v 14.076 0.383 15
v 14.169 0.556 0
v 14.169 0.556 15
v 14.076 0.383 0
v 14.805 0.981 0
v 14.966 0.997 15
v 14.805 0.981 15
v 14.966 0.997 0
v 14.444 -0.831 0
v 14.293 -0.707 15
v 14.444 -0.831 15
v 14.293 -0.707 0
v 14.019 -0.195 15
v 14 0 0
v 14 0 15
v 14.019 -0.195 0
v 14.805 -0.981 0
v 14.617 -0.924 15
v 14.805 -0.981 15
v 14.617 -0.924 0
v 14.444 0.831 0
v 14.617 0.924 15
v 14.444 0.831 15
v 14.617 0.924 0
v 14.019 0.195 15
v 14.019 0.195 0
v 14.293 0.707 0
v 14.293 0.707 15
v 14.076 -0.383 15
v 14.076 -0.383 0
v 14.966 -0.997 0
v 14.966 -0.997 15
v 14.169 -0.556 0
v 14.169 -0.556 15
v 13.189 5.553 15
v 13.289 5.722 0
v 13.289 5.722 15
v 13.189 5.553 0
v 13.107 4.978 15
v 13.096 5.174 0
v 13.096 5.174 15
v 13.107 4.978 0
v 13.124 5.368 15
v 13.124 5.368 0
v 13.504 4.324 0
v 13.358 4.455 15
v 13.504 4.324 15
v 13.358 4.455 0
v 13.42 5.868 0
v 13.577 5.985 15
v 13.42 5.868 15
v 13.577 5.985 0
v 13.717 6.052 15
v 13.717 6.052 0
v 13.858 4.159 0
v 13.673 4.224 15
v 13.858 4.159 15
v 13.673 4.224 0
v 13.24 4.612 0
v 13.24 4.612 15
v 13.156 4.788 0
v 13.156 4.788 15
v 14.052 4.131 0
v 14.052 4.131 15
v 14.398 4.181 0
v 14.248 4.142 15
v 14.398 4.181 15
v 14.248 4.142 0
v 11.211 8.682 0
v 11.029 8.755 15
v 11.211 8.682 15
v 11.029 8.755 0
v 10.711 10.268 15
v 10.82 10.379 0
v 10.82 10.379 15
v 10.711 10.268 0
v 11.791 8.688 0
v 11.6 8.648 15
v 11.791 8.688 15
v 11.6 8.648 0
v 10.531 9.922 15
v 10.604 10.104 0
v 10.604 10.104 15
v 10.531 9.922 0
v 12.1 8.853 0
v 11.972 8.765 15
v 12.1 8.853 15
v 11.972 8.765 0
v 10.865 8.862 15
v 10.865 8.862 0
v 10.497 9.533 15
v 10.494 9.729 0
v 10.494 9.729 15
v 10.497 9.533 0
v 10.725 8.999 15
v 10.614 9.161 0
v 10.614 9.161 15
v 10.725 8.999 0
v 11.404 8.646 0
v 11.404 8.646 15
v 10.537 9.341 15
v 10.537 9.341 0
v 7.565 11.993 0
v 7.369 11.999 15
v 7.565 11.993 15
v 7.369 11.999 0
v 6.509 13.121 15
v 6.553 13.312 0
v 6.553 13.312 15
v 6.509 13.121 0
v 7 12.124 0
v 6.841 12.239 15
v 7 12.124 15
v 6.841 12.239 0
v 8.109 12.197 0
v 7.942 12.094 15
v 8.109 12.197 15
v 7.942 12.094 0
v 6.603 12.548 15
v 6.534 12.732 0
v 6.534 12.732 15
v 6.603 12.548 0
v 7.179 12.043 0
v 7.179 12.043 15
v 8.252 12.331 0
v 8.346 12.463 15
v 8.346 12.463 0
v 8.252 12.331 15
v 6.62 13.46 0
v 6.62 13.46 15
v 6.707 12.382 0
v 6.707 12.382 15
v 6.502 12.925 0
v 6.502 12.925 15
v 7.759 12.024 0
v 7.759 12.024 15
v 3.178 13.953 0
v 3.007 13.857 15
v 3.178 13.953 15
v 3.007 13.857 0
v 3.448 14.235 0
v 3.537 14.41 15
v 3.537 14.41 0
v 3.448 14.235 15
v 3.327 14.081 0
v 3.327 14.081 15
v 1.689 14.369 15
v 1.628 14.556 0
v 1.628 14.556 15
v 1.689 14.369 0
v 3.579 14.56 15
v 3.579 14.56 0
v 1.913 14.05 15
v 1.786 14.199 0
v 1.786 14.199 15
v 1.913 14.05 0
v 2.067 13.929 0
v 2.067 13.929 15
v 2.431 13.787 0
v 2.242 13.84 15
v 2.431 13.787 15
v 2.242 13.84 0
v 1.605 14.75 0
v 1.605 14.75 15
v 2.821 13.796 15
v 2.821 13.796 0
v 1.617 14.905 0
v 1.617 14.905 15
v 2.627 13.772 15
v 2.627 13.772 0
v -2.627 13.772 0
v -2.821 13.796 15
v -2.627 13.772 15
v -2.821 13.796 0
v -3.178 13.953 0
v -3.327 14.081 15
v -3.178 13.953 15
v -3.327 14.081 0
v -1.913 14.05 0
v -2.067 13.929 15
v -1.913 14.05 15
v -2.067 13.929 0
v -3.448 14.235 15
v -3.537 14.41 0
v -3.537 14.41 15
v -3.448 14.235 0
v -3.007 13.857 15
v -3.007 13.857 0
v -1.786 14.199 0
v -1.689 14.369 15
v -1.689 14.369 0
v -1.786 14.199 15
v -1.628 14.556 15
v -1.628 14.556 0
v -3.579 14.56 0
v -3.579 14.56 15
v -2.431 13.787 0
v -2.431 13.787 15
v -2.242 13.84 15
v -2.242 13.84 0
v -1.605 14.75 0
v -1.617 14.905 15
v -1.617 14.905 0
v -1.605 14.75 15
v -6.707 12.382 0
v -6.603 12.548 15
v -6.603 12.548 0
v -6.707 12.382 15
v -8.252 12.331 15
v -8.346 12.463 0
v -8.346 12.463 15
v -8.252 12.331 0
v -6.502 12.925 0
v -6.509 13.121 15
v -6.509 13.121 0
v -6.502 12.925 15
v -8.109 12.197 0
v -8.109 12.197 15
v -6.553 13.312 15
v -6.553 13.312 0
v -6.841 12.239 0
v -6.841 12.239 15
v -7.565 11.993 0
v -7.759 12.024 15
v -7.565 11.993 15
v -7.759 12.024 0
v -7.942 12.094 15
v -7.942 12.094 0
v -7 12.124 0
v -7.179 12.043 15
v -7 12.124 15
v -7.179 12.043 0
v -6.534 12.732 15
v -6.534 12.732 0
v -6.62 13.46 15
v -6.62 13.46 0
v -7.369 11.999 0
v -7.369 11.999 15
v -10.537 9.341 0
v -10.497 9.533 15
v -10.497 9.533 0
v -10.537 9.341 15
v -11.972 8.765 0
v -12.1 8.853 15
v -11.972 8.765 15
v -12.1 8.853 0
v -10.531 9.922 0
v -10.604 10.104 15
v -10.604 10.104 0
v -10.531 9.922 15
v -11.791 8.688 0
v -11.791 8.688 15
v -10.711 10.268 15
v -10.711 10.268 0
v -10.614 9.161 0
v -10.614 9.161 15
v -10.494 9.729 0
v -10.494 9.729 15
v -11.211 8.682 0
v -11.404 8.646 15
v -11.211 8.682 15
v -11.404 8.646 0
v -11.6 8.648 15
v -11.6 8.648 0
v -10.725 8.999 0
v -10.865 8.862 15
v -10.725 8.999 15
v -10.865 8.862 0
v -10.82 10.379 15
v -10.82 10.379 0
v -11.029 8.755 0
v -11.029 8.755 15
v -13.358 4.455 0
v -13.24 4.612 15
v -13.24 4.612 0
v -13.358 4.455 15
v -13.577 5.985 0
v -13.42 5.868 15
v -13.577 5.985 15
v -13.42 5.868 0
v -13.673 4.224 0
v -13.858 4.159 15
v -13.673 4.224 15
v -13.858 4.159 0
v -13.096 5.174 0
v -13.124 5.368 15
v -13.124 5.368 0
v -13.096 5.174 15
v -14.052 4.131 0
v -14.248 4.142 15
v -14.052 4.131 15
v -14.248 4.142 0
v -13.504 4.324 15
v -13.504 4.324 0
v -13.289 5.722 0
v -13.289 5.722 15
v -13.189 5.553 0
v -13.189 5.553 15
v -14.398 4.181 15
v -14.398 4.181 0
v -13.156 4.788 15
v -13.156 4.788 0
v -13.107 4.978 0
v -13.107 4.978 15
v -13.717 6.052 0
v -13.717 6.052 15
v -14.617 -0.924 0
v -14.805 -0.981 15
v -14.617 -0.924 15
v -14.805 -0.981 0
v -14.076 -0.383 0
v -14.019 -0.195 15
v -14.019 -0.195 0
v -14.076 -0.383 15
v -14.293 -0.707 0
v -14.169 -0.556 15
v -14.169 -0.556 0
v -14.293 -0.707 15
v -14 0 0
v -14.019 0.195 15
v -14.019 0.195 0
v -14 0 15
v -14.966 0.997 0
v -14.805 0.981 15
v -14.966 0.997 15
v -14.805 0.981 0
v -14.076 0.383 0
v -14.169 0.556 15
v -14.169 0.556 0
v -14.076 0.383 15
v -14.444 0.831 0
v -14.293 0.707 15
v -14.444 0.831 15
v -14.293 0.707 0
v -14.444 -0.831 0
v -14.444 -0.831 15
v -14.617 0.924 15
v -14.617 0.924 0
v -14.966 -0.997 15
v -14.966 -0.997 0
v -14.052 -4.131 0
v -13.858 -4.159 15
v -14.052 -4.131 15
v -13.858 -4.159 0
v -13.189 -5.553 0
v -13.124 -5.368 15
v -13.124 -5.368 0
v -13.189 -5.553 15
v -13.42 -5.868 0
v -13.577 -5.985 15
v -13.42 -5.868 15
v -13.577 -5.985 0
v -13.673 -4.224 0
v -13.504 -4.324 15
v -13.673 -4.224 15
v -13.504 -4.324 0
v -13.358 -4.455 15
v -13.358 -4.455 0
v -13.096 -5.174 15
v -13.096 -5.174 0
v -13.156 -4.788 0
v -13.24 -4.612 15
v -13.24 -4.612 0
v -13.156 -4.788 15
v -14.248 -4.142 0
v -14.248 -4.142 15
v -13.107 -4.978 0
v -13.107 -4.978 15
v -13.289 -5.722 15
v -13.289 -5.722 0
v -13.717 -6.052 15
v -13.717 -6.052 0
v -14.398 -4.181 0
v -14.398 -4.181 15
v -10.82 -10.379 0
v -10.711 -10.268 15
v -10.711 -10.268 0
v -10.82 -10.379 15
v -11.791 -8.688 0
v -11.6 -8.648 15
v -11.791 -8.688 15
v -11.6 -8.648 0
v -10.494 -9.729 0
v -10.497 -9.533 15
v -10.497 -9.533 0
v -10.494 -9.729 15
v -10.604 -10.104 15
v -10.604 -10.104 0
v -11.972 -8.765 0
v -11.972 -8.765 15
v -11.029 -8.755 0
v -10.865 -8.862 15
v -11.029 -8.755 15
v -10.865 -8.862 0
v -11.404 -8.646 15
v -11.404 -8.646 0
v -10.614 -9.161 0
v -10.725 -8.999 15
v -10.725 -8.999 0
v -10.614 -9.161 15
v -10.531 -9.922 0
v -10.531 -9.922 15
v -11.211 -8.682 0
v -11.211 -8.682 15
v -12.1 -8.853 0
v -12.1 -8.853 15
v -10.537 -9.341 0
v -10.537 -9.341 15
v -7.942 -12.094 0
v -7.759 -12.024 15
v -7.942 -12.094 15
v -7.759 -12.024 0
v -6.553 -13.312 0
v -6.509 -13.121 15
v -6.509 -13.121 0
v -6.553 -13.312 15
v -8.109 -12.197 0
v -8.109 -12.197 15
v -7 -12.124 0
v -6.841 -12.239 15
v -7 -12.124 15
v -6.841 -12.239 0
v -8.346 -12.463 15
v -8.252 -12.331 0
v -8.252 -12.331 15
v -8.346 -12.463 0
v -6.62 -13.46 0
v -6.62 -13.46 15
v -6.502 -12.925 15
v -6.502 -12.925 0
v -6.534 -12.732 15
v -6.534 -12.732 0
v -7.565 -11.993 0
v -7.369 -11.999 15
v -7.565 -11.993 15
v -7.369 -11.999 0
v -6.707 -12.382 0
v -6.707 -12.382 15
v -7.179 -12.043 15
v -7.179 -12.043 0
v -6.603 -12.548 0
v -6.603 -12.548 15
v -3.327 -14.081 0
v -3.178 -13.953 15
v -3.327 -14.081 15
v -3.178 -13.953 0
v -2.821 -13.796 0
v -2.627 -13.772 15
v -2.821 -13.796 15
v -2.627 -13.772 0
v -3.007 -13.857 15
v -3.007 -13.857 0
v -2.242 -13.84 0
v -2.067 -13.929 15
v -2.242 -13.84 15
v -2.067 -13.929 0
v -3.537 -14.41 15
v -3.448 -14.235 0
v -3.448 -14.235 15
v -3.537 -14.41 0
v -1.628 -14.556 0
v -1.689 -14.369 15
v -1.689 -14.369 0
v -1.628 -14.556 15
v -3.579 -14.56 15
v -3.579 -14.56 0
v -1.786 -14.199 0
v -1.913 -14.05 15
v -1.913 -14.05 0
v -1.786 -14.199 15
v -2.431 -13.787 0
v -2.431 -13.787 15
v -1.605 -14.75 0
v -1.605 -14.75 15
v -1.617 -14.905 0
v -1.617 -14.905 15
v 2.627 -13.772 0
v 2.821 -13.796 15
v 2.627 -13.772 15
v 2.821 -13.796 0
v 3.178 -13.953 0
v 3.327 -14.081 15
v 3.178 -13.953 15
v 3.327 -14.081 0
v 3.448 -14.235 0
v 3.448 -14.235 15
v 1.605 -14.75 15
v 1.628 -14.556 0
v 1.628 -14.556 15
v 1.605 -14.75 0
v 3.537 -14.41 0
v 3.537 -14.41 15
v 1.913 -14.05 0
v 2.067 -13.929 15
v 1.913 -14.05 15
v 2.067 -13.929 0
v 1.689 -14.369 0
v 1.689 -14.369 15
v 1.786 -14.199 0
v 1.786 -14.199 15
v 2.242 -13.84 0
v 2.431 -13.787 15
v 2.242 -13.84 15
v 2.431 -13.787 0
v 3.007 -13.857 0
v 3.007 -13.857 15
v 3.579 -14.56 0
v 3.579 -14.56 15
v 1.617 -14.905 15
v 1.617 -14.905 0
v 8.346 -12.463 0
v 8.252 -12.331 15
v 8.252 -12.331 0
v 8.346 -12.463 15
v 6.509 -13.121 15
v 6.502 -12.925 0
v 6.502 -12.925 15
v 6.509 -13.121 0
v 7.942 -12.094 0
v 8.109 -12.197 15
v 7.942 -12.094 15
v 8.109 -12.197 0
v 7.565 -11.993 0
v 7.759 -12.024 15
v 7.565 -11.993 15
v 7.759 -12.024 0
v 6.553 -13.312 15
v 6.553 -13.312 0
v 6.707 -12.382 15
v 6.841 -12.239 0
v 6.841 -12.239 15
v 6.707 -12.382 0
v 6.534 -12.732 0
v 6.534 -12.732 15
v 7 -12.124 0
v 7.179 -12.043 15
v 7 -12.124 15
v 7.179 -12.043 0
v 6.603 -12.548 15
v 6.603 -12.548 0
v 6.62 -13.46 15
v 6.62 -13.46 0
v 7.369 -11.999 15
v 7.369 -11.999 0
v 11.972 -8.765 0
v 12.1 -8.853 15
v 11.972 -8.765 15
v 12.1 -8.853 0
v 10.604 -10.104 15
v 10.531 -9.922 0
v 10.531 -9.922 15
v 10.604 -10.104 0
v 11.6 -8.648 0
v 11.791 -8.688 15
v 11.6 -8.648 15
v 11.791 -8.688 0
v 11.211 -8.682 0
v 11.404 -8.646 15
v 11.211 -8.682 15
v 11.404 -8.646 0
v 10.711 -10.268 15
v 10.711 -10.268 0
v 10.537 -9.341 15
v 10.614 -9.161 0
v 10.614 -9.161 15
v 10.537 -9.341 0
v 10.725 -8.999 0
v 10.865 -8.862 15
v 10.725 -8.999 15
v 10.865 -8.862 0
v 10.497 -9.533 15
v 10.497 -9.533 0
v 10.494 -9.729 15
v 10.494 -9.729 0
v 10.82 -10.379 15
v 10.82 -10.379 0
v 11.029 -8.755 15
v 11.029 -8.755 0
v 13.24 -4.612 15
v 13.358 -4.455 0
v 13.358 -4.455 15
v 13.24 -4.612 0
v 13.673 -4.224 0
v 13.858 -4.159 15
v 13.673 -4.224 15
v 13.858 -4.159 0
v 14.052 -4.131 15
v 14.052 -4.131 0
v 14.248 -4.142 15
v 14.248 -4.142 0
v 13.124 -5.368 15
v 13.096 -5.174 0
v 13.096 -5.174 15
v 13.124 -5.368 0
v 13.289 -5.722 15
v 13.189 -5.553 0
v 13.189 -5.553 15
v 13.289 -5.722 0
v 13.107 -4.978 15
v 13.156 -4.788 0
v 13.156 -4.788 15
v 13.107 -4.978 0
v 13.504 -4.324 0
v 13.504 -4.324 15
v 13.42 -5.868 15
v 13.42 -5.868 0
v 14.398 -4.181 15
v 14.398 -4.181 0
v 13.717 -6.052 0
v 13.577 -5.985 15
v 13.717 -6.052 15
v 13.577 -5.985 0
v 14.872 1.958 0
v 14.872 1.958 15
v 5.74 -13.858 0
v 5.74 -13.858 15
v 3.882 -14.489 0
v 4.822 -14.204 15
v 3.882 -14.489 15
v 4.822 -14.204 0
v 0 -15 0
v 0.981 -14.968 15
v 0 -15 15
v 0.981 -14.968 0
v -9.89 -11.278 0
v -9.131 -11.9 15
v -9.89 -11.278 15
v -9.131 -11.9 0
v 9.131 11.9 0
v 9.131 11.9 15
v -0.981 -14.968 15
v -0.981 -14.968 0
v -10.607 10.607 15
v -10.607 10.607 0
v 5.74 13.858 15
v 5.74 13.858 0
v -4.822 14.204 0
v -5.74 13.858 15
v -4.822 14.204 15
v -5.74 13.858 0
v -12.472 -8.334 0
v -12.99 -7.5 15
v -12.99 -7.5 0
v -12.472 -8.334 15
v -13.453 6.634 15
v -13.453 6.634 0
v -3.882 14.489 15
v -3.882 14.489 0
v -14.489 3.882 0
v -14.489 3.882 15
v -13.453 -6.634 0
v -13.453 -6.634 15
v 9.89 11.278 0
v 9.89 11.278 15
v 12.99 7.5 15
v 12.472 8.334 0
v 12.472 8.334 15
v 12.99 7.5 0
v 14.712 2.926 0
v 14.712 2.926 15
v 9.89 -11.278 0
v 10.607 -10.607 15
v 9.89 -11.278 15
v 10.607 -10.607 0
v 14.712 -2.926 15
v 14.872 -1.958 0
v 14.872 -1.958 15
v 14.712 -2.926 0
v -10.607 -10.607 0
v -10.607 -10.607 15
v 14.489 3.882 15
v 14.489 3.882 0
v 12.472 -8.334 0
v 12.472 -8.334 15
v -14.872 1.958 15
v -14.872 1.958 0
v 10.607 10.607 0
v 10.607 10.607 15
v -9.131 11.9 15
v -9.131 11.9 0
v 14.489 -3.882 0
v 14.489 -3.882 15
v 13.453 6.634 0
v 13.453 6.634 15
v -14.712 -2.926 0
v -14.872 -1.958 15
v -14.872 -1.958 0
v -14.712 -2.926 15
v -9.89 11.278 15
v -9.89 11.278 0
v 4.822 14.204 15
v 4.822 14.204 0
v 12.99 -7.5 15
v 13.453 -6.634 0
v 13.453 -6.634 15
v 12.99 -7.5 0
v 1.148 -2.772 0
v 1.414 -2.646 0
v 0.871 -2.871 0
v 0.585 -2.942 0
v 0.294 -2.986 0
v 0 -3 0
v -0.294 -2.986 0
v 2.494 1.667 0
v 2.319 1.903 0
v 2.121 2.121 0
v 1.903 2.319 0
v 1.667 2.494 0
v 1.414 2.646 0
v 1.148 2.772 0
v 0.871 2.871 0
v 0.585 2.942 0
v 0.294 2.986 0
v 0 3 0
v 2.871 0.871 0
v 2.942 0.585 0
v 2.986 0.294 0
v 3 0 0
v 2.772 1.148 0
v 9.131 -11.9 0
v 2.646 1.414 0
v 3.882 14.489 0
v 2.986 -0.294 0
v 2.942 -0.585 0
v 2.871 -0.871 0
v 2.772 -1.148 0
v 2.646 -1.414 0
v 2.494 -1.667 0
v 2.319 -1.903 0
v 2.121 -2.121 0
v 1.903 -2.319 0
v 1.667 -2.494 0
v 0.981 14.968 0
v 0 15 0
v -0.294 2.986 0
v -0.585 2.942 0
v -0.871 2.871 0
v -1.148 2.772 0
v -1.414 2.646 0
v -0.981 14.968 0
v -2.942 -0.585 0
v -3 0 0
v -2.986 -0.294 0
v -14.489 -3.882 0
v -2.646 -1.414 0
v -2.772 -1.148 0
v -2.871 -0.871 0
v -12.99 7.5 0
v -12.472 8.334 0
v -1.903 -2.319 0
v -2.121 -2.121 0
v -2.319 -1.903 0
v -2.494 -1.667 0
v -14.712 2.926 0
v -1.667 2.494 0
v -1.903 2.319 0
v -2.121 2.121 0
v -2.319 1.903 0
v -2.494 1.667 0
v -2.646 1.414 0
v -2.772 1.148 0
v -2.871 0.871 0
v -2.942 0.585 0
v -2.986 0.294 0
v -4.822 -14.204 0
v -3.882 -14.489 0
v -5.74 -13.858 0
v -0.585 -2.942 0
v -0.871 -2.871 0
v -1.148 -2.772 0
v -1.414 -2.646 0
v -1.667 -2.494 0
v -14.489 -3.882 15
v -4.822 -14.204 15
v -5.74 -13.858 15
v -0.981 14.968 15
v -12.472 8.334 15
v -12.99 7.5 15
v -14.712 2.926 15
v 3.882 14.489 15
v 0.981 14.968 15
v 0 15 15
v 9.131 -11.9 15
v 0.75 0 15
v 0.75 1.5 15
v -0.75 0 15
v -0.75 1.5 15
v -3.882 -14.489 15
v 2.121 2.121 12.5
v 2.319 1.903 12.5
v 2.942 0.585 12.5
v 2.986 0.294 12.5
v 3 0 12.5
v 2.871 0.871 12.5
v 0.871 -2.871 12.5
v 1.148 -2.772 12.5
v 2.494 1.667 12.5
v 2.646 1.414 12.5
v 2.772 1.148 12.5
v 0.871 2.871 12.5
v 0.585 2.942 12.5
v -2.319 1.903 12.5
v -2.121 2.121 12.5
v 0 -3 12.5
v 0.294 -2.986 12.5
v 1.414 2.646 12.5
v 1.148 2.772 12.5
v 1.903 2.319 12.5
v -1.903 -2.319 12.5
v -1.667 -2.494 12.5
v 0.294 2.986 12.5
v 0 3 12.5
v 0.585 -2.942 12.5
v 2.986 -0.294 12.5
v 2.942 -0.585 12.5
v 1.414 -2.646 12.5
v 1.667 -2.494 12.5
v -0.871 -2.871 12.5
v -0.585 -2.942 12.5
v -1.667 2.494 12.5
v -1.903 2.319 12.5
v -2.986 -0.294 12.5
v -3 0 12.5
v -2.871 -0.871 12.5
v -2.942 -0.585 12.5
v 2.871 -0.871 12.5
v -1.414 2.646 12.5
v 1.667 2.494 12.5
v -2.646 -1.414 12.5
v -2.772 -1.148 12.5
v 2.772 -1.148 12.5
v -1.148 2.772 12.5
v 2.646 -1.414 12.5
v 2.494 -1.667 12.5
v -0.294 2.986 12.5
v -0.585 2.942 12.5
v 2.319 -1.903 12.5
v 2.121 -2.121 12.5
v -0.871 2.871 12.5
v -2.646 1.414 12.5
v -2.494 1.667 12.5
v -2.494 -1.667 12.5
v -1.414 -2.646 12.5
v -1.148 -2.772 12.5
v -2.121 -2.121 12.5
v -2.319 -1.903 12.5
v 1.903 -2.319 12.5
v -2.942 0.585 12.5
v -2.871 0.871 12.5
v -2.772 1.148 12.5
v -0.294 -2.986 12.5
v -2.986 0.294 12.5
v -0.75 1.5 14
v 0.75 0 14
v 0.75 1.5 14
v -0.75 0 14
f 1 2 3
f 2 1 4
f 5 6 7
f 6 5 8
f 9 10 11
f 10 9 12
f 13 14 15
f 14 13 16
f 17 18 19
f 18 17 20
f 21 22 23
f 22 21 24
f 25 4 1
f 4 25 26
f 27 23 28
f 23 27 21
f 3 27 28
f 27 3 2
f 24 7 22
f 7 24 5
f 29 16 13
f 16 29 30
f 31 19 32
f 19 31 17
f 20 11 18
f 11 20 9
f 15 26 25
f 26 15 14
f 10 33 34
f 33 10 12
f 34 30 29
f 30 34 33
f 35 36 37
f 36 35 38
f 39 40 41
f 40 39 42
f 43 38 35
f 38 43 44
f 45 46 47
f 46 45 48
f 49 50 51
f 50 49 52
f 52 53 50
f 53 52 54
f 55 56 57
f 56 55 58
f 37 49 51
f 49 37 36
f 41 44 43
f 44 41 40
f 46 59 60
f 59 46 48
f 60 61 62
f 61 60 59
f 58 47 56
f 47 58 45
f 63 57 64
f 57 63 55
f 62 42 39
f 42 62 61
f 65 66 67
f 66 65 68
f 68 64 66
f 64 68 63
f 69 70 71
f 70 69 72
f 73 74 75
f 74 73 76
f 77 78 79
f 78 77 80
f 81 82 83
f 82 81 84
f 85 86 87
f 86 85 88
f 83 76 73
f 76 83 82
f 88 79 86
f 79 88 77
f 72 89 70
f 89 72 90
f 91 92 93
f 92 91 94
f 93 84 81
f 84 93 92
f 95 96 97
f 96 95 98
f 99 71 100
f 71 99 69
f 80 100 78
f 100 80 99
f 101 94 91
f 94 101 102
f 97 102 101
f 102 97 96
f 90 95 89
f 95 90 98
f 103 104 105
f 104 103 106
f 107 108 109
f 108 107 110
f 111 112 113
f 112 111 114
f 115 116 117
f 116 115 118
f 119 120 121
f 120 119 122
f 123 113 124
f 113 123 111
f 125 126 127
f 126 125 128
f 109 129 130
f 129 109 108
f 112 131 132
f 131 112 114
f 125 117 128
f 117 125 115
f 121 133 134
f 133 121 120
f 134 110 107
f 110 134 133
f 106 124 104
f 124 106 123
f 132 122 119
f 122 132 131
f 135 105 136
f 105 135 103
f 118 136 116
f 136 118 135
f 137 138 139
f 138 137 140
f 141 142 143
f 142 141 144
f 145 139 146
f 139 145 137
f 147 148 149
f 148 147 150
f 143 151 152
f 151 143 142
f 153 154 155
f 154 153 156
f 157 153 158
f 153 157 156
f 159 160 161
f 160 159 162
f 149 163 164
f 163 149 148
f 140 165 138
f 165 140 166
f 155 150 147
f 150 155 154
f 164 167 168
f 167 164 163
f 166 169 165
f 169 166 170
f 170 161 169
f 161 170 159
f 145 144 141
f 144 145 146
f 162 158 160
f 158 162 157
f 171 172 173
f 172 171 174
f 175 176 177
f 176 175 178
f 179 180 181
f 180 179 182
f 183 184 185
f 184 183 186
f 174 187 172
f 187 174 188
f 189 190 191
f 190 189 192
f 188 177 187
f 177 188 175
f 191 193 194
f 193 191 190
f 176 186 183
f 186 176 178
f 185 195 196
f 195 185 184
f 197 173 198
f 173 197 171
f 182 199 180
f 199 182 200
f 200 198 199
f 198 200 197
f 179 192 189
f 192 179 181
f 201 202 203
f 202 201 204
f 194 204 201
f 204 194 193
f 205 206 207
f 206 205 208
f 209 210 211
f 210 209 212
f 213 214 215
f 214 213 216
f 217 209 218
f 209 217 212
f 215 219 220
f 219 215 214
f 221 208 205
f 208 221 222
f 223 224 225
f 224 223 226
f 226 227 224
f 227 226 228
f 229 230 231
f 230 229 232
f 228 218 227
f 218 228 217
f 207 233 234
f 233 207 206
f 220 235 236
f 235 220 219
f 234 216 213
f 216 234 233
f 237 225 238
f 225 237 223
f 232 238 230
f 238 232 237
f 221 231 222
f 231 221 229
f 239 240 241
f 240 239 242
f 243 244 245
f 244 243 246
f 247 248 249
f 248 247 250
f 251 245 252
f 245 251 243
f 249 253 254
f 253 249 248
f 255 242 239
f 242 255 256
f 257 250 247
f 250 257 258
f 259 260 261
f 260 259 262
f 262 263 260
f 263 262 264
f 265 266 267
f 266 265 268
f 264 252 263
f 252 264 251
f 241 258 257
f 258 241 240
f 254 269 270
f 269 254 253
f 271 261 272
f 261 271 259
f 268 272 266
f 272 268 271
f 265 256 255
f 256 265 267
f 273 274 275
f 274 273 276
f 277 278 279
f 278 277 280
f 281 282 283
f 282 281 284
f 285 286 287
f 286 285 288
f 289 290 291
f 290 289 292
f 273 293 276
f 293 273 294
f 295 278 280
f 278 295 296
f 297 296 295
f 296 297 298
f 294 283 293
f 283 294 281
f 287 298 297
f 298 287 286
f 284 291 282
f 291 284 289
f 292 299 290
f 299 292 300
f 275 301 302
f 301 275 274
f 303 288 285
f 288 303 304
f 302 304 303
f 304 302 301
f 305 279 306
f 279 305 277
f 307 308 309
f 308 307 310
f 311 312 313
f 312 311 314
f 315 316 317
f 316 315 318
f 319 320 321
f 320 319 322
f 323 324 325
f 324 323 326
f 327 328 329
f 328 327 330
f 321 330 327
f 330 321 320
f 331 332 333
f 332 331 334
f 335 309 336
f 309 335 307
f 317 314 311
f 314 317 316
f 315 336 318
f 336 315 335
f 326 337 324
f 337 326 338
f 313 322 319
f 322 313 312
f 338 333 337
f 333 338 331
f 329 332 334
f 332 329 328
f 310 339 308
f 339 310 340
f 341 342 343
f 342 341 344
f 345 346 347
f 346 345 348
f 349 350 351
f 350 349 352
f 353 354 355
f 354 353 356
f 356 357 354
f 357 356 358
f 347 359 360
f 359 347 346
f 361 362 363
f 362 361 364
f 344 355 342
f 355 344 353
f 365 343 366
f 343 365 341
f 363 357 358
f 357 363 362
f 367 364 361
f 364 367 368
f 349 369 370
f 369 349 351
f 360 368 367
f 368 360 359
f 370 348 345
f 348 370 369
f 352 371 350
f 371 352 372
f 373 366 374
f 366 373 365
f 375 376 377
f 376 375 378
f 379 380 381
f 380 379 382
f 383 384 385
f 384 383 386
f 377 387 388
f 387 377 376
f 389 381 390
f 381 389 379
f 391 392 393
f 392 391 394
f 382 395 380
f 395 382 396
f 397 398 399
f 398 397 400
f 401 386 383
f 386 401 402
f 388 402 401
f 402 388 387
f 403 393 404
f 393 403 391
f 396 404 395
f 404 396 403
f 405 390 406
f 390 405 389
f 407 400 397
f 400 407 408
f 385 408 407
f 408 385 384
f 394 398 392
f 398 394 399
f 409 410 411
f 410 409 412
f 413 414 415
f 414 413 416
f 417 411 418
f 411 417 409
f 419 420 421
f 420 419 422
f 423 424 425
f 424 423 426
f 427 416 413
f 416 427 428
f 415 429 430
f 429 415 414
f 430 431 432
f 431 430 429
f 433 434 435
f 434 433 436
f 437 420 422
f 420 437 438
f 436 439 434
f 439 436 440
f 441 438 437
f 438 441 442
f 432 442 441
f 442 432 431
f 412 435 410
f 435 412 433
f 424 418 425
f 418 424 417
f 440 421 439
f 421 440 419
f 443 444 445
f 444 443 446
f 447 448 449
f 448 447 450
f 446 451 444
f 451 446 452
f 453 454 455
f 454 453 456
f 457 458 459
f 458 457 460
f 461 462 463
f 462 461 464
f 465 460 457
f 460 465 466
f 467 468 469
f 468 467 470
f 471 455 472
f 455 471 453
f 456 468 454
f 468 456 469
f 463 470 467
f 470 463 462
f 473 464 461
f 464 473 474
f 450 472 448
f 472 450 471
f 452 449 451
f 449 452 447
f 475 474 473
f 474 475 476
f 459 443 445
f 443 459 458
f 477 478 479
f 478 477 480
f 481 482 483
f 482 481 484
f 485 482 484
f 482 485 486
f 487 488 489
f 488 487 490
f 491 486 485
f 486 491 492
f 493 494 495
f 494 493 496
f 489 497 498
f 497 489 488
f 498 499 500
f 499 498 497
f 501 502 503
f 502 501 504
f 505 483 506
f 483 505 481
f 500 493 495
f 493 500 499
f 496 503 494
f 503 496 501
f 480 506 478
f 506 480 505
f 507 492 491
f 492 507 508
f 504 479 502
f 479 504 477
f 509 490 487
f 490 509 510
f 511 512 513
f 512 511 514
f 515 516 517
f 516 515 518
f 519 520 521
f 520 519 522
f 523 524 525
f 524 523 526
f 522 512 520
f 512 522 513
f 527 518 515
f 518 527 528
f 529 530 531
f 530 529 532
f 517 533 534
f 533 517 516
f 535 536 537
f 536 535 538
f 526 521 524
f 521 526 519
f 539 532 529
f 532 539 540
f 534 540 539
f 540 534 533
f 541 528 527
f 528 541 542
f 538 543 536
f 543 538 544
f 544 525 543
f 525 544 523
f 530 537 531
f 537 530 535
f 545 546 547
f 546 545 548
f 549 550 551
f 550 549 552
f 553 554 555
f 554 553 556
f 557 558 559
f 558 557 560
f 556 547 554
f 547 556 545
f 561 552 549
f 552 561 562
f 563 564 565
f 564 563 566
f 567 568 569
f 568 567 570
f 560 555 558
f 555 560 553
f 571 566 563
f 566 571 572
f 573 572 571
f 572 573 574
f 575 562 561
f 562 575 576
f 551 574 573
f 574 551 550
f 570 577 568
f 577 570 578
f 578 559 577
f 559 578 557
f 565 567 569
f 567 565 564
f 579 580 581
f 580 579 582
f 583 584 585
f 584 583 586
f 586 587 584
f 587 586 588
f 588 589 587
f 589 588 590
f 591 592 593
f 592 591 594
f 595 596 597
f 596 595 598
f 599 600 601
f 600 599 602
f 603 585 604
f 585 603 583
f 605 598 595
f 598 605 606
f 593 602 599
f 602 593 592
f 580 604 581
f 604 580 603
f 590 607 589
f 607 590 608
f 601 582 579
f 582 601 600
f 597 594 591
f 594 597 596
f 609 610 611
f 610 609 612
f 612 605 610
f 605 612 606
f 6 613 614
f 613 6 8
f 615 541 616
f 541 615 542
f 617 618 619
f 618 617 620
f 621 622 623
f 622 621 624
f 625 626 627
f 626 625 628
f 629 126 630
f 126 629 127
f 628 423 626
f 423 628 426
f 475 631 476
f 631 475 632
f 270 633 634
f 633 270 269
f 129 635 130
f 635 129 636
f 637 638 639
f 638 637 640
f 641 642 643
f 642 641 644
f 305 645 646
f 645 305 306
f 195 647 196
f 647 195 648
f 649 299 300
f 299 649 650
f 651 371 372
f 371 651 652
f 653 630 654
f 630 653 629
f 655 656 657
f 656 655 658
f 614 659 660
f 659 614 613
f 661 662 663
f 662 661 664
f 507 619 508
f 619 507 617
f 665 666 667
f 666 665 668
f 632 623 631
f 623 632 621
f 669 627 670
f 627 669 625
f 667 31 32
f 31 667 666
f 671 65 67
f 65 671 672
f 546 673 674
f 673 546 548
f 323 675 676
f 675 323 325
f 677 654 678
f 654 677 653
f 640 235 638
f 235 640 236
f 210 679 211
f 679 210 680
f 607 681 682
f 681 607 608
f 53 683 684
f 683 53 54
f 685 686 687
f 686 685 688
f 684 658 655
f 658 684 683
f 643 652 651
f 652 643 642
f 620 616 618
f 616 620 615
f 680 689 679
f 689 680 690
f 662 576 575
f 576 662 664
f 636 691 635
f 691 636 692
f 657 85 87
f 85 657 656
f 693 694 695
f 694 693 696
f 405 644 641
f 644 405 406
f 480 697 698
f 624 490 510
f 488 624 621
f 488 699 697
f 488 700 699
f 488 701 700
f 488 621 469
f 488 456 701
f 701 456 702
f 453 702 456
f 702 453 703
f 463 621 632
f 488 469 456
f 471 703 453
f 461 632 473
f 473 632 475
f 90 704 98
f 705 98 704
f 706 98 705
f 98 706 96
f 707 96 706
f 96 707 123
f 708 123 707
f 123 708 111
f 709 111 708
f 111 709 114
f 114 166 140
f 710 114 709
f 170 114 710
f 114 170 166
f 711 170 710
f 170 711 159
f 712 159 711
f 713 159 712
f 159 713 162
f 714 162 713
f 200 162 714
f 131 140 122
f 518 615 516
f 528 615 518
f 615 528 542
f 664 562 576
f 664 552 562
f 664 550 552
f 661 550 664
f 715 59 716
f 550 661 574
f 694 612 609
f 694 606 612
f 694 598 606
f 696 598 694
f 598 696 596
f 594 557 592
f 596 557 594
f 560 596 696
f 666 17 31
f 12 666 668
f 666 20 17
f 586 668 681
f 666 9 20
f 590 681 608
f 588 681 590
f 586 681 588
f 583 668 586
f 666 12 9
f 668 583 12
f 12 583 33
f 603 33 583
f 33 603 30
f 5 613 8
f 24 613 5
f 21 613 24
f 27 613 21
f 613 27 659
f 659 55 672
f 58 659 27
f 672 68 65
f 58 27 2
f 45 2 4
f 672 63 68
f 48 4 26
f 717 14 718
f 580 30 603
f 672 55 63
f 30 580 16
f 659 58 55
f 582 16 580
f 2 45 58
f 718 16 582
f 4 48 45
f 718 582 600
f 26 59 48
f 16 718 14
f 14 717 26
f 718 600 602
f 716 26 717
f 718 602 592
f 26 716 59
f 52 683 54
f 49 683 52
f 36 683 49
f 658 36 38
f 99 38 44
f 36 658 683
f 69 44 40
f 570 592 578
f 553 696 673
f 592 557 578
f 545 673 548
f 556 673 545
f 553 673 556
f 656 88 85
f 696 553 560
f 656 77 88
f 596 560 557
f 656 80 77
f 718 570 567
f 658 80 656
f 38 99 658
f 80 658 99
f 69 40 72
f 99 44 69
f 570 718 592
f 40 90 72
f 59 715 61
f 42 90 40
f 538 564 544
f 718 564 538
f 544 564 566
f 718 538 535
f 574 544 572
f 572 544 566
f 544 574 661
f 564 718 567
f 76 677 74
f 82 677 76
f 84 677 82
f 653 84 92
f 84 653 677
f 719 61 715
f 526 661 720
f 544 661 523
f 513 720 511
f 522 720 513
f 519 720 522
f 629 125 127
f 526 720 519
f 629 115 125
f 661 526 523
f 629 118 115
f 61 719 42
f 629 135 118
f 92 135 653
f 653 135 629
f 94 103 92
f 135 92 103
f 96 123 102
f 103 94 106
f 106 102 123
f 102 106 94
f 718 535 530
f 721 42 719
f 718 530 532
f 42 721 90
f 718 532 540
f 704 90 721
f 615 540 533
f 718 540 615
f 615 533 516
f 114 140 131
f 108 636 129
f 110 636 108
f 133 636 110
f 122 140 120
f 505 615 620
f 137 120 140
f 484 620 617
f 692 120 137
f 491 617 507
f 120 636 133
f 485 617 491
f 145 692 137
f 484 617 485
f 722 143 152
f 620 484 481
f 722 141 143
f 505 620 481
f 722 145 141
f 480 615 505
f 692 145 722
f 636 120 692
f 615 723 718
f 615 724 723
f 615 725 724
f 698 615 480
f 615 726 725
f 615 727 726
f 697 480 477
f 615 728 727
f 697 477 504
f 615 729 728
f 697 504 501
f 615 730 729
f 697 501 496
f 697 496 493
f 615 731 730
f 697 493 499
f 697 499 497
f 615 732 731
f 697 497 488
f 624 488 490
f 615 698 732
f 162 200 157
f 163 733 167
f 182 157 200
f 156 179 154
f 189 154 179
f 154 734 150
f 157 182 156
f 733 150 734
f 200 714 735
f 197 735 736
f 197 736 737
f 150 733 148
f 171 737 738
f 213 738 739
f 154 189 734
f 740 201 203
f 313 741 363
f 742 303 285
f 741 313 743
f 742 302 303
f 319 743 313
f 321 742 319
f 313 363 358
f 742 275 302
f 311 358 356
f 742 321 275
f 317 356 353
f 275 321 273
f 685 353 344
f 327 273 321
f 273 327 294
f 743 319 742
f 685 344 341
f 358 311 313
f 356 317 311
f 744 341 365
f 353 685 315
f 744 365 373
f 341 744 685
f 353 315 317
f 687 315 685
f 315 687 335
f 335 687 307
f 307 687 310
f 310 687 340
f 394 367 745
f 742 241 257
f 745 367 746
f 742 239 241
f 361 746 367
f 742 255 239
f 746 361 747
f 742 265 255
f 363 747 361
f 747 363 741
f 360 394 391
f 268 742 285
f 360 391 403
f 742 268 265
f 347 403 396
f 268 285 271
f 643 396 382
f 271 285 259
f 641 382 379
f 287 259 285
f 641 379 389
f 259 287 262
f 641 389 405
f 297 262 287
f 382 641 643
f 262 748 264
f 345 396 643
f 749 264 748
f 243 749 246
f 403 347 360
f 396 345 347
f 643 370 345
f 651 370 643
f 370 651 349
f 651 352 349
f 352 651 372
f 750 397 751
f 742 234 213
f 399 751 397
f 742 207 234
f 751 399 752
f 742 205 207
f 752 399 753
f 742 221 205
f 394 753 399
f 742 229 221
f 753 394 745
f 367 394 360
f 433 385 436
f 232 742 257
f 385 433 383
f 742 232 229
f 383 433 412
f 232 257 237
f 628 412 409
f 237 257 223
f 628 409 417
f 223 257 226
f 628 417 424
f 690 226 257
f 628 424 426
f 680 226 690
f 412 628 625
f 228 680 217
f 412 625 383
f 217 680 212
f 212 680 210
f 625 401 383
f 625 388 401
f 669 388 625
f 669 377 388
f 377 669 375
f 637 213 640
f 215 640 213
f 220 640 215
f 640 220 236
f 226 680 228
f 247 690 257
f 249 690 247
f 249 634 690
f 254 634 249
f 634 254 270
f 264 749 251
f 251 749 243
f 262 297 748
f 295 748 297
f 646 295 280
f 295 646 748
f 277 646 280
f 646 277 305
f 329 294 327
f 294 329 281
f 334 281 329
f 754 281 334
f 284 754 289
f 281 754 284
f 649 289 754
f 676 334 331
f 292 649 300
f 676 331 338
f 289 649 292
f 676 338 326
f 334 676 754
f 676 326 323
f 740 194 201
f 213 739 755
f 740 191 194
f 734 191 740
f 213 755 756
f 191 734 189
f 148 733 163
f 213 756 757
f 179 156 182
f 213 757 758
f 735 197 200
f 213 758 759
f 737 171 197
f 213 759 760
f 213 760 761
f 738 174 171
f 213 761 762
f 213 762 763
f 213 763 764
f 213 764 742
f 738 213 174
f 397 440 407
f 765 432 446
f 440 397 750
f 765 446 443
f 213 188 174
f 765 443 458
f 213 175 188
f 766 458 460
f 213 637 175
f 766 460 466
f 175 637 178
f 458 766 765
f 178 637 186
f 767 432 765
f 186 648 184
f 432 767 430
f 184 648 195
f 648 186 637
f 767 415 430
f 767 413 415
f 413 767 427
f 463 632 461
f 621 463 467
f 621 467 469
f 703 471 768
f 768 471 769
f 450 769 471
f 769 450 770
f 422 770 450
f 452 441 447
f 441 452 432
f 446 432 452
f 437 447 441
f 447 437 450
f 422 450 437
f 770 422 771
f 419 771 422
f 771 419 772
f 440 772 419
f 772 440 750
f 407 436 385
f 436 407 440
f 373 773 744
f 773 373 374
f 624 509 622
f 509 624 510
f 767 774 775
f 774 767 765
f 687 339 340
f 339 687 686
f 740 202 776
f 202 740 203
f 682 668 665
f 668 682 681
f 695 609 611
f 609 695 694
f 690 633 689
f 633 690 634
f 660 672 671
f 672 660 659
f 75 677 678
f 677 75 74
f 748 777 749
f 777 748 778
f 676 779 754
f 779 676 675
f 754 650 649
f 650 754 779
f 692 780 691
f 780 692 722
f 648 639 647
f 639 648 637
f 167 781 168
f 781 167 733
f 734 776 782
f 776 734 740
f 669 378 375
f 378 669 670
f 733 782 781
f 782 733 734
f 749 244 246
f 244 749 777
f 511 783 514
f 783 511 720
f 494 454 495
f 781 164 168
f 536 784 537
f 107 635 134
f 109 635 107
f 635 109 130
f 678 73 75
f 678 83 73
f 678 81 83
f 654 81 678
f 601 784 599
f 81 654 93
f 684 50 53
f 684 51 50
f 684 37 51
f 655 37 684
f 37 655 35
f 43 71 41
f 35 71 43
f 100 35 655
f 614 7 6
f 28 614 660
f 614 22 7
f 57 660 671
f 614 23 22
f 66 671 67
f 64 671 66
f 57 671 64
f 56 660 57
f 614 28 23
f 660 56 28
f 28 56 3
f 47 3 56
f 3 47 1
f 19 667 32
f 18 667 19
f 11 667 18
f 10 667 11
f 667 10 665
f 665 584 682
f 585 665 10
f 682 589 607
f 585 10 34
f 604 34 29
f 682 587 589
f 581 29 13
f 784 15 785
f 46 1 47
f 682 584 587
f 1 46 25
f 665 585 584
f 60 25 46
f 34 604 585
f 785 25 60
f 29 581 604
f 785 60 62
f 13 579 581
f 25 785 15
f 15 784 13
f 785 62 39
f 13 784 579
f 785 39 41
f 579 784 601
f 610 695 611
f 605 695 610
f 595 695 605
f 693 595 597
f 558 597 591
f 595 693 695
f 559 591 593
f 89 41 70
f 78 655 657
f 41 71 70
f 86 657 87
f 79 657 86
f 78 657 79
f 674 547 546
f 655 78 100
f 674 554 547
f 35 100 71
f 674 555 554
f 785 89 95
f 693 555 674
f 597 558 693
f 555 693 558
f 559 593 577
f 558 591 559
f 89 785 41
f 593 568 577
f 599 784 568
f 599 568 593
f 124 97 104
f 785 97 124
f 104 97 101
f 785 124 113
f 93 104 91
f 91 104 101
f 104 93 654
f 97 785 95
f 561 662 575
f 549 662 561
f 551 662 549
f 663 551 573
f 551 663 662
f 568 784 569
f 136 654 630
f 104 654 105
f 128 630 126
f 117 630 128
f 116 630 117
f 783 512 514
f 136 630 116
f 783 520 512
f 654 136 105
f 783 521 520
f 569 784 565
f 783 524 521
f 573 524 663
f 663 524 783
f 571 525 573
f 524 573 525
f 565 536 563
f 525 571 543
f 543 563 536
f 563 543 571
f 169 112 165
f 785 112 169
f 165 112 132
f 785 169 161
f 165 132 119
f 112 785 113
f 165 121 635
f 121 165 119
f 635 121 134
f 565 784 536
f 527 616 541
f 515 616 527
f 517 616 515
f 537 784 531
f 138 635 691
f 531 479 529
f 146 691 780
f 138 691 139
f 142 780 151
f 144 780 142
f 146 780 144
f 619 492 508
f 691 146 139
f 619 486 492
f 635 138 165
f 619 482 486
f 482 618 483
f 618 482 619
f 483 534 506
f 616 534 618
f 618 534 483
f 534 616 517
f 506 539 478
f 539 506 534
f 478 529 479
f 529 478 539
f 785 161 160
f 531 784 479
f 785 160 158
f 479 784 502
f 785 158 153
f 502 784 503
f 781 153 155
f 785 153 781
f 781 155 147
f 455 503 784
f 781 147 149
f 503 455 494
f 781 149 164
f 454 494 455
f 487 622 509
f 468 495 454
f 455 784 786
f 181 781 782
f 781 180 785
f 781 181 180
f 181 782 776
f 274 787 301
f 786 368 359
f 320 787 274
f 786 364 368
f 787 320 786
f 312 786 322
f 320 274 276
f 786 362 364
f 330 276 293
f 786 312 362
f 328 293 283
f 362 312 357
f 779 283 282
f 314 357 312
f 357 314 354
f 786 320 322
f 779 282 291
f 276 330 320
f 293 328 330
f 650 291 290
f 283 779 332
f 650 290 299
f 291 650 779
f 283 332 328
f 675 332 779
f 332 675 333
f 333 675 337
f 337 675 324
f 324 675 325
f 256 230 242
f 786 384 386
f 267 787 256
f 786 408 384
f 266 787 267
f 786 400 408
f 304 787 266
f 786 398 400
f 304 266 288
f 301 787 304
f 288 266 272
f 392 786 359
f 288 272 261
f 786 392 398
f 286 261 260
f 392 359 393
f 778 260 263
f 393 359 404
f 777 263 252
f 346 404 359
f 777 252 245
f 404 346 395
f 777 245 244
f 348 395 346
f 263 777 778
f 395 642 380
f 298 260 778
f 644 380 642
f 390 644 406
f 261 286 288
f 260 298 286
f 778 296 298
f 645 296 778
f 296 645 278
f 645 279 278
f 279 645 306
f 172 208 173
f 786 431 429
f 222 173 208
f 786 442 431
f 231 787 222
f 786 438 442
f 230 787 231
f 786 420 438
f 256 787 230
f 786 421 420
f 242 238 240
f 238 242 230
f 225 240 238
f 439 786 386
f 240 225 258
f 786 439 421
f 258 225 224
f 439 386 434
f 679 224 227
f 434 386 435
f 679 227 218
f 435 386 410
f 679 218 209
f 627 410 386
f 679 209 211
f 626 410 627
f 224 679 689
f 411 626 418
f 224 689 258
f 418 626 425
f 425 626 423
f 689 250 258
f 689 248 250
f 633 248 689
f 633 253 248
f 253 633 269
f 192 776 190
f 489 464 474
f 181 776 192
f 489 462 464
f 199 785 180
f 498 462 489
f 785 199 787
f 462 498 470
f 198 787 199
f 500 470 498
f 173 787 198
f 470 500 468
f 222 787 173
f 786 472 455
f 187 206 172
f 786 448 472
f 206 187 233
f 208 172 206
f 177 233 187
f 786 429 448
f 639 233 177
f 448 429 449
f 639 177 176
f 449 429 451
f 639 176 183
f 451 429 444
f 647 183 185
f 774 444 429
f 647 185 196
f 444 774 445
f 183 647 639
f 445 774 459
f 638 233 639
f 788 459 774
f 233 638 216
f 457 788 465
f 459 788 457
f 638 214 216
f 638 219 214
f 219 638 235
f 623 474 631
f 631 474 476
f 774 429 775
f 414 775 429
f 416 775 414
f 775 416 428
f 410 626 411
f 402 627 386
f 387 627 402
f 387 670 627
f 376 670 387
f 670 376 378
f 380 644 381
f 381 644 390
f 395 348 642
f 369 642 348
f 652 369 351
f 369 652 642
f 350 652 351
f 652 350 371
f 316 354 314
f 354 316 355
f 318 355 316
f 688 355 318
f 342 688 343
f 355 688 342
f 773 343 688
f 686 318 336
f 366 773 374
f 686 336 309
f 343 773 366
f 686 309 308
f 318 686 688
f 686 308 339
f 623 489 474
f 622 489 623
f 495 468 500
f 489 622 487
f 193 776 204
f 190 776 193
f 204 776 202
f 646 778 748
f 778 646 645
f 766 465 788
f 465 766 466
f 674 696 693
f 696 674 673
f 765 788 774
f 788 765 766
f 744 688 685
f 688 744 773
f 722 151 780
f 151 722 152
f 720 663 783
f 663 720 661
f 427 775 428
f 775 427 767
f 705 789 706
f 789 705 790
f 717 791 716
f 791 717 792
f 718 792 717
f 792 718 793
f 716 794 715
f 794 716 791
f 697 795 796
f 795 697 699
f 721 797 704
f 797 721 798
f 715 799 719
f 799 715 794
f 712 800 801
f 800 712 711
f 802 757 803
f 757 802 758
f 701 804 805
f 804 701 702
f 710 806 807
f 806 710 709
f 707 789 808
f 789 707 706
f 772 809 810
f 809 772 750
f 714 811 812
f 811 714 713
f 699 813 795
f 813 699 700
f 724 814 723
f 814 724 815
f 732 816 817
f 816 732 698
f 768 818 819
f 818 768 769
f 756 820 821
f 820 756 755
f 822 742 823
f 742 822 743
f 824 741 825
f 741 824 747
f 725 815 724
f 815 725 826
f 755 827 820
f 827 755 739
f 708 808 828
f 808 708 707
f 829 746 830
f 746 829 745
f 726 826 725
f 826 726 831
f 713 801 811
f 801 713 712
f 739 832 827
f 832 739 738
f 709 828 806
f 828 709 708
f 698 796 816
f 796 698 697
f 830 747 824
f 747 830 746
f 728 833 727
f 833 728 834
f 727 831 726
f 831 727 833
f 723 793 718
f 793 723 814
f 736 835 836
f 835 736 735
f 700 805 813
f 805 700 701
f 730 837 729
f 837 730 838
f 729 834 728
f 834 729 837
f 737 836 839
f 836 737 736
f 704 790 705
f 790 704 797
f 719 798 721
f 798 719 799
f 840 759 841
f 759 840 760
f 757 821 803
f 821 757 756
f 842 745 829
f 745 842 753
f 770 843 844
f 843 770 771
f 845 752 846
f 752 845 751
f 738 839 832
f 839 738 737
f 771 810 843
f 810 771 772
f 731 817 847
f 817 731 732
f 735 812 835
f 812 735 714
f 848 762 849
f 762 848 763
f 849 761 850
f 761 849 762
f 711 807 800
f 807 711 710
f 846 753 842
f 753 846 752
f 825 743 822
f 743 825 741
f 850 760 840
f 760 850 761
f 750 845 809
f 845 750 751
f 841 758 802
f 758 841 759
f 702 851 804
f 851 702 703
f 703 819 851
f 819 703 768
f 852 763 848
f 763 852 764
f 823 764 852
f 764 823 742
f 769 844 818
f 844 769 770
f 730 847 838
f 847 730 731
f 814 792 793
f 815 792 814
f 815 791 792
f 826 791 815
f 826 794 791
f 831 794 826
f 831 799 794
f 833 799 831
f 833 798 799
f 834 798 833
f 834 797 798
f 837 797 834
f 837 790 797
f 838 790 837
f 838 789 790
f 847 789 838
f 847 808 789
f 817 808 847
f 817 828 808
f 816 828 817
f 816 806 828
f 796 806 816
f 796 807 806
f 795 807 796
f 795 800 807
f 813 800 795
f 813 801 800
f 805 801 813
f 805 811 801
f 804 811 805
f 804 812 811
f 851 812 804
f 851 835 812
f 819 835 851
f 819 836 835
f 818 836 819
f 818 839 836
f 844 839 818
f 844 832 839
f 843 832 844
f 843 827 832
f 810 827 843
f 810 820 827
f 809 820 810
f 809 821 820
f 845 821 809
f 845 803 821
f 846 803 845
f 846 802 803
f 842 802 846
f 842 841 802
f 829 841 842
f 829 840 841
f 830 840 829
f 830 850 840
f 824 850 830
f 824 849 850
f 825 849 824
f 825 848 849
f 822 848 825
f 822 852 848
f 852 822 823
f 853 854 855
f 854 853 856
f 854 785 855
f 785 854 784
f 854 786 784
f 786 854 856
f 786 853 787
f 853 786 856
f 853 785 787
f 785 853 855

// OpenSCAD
// Replacement knob for hotplate stirrer with D-shaft
// Print orientation: side facing hotplate down on bed (z = 0)

// ---------------- Parameters ----------------
knob_d          = 30;    // knob outer diameter
knob_h          = 15;    // knob height
bore_depth      = 12;    // D-shaped blind bore depth from bottom face
shaft_d         = 6;     // D-shaft diameter
bore_flat       = 4.7;   // distance from flat to opposite side of D-bore
groove_count    = 18;    // number of vertical grip grooves
groove_d        = 2;     // groove diameter (half-cylinder)
pointer_w       = 1.5;   // pointer groove width
pointer_d       = 1;     // pointer groove depth
eps             = 0.5;   // cutter overshoot past faces

$fn = 96;

// ---------------- Model ----------------
difference() {
    // Main knob body
    cylinder(d = knob_d, h = knob_h);

    // D-shaped blind bore from bottom face
    translate([0, 0, -eps])
        cylinder(d = shaft_d, h = bore_depth + 2 * eps, $fn = 64);
    translate([0, 0, -eps])
        linear_extrude(height = bore_depth + 2 * eps)
            circle(d = bore_flat, $fn = 64);

    // Vertical grip grooves around full height
    for (i = [0 : groove_count - 1]) {
        rotate([0, 0, i * 360 / groove_count])
            translate([knob_d / 2, 0, -eps])
                cylinder(d = groove_d, h = knob_h + 2 * eps, $fn = 32);
    }

    // Pointer groove on top face, same side as D-bore flat
    // (aligned with X axis; flat of D-bore lies on -X side)
    translate([0, 0, knob_h - pointer_d])
        linear_extrude(height = pointer_d + eps)
            polygon([[-pointer_w / 2, 0], [pointer_w / 2, 0],
                     [pointer_w / 2, pointer_w], [-pointer_w / 2, pointer_w]]);
}
